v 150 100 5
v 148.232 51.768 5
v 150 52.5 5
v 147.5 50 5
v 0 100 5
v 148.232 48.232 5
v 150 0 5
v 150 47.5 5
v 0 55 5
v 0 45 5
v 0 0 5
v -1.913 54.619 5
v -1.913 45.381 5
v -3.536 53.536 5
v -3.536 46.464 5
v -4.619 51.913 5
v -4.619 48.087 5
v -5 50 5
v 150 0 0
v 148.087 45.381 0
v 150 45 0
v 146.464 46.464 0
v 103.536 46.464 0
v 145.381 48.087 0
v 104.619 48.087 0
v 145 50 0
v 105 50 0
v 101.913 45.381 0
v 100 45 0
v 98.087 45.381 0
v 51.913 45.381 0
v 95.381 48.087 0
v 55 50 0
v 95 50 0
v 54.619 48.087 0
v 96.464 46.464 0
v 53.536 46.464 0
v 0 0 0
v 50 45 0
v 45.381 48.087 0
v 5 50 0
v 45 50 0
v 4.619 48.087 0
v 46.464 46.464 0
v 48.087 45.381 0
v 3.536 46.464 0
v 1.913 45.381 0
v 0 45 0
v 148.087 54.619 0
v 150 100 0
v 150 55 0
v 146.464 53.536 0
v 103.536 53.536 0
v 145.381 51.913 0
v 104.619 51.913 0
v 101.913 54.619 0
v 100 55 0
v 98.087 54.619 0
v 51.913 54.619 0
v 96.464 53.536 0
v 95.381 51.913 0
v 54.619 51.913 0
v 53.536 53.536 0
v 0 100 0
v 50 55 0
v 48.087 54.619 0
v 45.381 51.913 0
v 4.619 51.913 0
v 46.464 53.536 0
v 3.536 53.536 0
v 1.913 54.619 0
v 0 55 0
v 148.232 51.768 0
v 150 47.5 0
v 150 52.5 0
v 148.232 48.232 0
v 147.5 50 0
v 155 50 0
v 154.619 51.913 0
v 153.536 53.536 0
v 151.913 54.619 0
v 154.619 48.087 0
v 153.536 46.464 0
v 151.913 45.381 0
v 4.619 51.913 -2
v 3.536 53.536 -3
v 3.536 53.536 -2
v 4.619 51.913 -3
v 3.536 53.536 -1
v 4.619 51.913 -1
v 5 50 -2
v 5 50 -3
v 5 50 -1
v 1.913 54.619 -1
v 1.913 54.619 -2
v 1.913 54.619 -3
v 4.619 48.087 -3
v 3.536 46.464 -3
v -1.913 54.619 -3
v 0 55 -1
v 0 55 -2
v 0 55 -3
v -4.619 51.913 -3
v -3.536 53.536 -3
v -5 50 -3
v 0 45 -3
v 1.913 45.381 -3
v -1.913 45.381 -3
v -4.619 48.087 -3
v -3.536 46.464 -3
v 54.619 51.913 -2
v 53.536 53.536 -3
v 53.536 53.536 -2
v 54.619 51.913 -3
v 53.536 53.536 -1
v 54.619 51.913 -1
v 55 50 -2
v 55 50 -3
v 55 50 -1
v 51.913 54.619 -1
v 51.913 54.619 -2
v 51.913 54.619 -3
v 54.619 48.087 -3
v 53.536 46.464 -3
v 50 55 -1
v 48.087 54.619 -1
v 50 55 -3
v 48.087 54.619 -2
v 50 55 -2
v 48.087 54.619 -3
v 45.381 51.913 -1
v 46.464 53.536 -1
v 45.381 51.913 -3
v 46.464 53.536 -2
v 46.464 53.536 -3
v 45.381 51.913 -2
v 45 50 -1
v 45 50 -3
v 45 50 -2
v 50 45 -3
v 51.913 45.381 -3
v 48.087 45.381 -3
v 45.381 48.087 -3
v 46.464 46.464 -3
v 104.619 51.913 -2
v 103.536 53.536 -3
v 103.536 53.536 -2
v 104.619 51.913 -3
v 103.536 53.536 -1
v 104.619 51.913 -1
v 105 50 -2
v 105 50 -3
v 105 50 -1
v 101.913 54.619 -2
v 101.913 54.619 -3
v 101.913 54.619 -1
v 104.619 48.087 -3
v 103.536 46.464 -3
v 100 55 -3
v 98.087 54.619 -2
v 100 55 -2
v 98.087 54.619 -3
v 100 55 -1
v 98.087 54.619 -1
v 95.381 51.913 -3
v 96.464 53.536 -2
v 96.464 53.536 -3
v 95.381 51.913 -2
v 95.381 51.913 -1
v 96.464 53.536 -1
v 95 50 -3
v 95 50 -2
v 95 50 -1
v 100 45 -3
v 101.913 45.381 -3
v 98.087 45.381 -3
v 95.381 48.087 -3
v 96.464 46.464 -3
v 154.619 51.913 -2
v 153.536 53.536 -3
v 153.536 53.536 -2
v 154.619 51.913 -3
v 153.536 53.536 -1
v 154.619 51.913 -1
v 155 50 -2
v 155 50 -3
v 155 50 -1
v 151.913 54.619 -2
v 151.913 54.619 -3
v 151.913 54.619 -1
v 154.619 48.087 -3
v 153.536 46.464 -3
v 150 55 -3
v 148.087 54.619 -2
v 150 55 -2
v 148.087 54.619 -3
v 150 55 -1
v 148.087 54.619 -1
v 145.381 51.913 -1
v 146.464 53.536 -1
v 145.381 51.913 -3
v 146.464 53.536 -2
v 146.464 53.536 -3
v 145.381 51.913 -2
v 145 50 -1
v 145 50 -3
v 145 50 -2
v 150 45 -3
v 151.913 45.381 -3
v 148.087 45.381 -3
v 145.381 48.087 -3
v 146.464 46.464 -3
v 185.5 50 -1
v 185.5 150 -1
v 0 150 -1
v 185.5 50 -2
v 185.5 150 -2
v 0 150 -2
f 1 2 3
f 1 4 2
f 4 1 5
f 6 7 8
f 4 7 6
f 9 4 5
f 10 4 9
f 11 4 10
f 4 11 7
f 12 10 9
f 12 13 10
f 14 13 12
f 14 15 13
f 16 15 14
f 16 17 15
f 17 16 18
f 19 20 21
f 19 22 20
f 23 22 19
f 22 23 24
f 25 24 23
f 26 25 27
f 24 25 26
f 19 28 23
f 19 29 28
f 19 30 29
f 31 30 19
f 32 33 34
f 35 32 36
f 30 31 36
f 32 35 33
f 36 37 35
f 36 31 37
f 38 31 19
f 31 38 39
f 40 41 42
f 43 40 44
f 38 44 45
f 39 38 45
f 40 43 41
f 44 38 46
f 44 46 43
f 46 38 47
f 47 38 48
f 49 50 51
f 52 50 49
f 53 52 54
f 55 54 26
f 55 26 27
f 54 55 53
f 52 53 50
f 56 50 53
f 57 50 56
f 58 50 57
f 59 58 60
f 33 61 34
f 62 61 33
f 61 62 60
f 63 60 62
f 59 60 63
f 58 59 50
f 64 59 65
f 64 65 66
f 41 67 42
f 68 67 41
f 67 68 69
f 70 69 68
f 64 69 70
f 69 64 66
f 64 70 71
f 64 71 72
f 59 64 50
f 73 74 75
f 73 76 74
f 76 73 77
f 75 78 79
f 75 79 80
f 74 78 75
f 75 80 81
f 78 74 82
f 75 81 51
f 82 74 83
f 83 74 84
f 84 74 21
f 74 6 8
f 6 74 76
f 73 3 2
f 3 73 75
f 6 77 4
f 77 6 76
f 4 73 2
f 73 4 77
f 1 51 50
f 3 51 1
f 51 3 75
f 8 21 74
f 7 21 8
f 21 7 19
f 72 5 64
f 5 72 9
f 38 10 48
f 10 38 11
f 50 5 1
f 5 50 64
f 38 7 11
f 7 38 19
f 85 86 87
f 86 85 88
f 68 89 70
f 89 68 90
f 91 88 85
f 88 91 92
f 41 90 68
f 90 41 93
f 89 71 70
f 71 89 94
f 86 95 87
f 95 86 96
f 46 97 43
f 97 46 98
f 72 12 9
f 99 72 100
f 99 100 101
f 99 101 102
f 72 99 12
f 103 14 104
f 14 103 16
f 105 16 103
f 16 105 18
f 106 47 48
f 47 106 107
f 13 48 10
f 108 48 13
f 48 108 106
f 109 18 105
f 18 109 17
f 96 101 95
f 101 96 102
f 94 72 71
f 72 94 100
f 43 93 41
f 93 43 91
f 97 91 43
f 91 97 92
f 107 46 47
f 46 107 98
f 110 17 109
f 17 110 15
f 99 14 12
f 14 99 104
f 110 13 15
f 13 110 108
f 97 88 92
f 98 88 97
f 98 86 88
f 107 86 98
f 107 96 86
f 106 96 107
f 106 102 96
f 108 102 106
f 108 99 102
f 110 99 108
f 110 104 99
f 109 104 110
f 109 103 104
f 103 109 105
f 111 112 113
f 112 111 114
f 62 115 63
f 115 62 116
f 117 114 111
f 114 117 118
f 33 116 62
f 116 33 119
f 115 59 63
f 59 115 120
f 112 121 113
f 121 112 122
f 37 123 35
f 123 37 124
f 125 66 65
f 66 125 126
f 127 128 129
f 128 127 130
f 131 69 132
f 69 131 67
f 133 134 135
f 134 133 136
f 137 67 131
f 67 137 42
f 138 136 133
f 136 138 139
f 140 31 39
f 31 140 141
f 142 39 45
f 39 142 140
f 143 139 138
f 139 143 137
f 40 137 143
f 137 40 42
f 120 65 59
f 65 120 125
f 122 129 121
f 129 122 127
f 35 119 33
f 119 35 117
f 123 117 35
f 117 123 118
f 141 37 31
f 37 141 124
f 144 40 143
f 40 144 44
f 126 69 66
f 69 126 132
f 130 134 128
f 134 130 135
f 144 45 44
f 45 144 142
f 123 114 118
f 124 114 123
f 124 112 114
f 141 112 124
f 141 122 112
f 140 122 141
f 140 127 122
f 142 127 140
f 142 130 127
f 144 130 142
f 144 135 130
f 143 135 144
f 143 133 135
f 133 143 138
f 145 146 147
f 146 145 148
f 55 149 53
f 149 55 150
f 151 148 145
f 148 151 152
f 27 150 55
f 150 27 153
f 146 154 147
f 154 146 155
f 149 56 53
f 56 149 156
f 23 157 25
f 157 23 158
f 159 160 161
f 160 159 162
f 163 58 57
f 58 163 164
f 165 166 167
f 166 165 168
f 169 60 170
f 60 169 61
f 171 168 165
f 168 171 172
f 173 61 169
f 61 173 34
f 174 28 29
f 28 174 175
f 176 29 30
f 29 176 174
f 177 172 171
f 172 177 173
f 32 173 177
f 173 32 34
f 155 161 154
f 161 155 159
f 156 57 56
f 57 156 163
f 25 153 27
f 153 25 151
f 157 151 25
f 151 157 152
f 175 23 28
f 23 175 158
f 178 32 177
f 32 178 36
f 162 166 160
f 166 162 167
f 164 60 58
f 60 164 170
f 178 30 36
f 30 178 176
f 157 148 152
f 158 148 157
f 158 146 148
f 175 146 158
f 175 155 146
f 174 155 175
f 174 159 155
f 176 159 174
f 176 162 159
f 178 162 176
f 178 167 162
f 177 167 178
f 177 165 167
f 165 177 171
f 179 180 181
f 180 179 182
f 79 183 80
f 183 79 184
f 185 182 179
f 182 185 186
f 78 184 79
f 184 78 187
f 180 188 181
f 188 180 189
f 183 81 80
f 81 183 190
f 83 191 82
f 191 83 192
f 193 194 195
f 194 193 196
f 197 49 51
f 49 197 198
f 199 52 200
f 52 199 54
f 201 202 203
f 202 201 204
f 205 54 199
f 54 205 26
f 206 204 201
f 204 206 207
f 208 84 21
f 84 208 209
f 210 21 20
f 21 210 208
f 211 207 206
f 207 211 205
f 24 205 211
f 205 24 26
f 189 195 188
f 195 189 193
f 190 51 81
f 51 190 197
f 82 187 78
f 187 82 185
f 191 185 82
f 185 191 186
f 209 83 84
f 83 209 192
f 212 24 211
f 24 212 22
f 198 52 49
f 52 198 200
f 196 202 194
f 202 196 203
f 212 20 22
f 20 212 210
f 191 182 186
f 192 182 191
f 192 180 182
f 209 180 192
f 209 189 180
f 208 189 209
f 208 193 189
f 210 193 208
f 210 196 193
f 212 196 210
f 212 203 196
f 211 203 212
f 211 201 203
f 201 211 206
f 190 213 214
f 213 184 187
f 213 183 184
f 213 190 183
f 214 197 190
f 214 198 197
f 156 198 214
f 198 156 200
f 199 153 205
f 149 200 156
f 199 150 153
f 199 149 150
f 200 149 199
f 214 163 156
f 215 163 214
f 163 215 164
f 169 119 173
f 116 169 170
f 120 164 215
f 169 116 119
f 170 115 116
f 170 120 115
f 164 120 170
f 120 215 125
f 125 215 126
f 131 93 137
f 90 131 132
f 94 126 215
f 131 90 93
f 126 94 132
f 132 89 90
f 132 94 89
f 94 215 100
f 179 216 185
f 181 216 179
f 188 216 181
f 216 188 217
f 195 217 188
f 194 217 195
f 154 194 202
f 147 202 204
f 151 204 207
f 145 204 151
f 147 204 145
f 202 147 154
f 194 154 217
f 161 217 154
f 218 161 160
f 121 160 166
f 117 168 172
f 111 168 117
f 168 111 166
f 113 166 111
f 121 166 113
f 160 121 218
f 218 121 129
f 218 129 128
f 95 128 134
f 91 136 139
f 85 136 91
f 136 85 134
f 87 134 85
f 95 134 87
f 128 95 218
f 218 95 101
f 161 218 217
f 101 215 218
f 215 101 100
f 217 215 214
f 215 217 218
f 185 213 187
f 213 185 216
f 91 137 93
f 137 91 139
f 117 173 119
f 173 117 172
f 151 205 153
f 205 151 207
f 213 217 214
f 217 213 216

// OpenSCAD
union() {
	difference() {
		difference() {
			cube(center = false, size = [150, 100, 5]);
			union() {
				translate(v = [0.0000000000, 50.0000000000, 0]) {
					cylinder(center = false, h = 5, r = 2.5000000000);
				}
				translate(v = [50.0000000000, 50.0000000000, 0]) {
					cylinder(center = false, h = 5, r = 2.5000000000);
				}
				translate(v = [100.0000000000, 50.0000000000, 0]) {
					cylinder(center = false, h = 5, r = 2.5000000000);
				}
				translate(v = [150.0000000000, 50.0000000000, 0]) {
					cylinder(center = false, h = 5, r = 2.5000000000);
				}
			}
		}
	}
	union() {
		translate(v = [0, 0, 0]) {
			cube(center = false, size = [2, 100, 5]);
		}
		translate(v = [10, 0, 0]) {
			cube(center = false, size = [2, 100, 5]);
		}
		translate(v = [20, 0, 0]) {
			cube(center = false, size = [2, 100, 5]);
		}
		translate(v = [30, 0, 0]) {
			cube(center = false, size = [2, 100, 5]);
		}
		translate(v = [40, 0, 0]) {
			cube(center = false, size = [2, 100, 5]);
		}
		translate(v = [50, 0, 0]) {
			cube(center = false, size = [2, 100, 5]);
		}
		translate(v = [60, 0, 0]) {
			cube(center = false, size = [2, 100, 5]);
		}
		translate(v = [70, 0, 0]) {
			cube(center = false, size = [2, 100, 5]);
		}
		translate(v = [80, 0, 0]) {
			cube(center = false, size = [2, 100, 5]);
		}
		translate(v = [90, 0, 0]) {
			cube(center = false, size = [2, 100, 5]);
		}
		translate(v = [100, 0, 0]) {
			cube(center = false, size = [2, 100, 5]);
		}
		translate(v = [110, 0, 0]) {
			cube(center = false, size = [2, 100, 5]);
		}
		translate(v = [120, 0, 0]) {
			cube(center = false, size = [2, 100, 5]);
		}
		translate(v = [130, 0, 0]) {
			cube(center = false, size = [2, 100, 5]);
		}
		translate(v = [140, 0, 0]) {
			cube(center = false, size = [2, 100, 5]);
		}
	}
	union() {
		translate(v = [0.0000000000, 50.0000000000, -3]) {
			cylinder(center = false, h = 3, r = 5.0000000000);
		}
		translate(v = [50.0000000000, 50.0000000000, -3]) {
			cylinder(center = false, h = 3, r = 5.0000000000);
		}
		translate(v = [100.0000000000, 50.0000000000, -3]) {
			cylinder(center = false, h = 3, r = 5.0000000000);
		}
		translate(v = [150.0000000000, 50.0000000000, -3]) {
			cylinder(center = false, h = 3, r = 5.0000000000);
		}
	}
	union() {
		translate(v = [0, 50.0000000000, 2.5000000000]) {
			cylinder(center = true, h = 5, r = 5.0000000000);
		}
		translate(v = [10, 50.0000000000, 2.5000000000]) {
			cylinder(center = true, h = 5, r = 5.0000000000);
		}
		translate(v = [20, 50.0000000000, 2.5000000000]) {
			cylinder(center = true, h = 5, r = 5.0000000000);
		}
		translate(v = [30, 50.0000000000, 2.5000000000]) {
			cylinder(center = true, h = 5, r = 5.0000000000);
		}
		translate(v = [40, 50.0000000000, 2.5000000000]) {
			cylinder(center = true, h = 5, r = 5.0000000000);
		}
		translate(v = [50, 50.0000000000, 2.5000000000]) {
			cylinder(center = true, h = 5, r = 5.0000000000);
		}
		translate(v = [60, 50.0000000000, 2.5000000000]) {
			cylinder(center = true, h = 5, r = 5.0000000000);
		}
		translate(v = [70, 50.0000000000, 2.5000000000]) {
			cylinder(center = true, h = 5, r = 5.0000000000);
		}
		translate(v = [80, 50.0000000000, 2.5000000000]) {
			cylinder(center = true, h = 5, r = 5.0000000000);
		}
		translate(v = [90, 50.0000000000, 2.5000000000]) {
			cylinder(center = true, h = 5, r = 5.0000000000);
		}
		translate(v = [100, 50.0000000000, 2.5000000000]) {
			cylinder(center = true, h = 5, r = 5.0000000000);
		}
		translate(v = [110, 50.0000000000, 2.5000000000]) {
			cylinder(center = true, h = 5, r = 5.0000000000);
		}
		translate(v = [120, 50.0000000000, 2.5000000000]) {
			cylinder(center = true, h = 5, r = 5.0000000000);
		}
		translate(v = [130, 50.0000000000, 2.5000000000]) {
			cylinder(center = true, h = 5, r = 5.0000000000);
		}
		translate(v = [140, 50.0000000000, 2.5000000000]) {
			cylinder(center = true, h = 5, r = 5.0000000000);
		}
	}
	union() {
		translate(v = [0, 50.0000000000, -2]) {
			cube(center = false, size = [37.5000000000, 100, 1]);
		}
		translate(v = [37, 50.0000000000, -2]) {
			cube(center = false, size = [37.5000000000, 100, 1]);
		}
		translate(v = [74, 50.0000000000, -2]) {
			cube(center = false, size = [37.5000000000, 100, 1]);
		}
		translate(v = [111, 50.0000000000, -2]) {
			cube(center = false, size = [37.5000000000, 100, 1]);
		}
		translate(v = [148, 50.0000000000, -2]) {
			cube(center = false, size = [37.5000000000, 100, 1]);
		}
	}
}
